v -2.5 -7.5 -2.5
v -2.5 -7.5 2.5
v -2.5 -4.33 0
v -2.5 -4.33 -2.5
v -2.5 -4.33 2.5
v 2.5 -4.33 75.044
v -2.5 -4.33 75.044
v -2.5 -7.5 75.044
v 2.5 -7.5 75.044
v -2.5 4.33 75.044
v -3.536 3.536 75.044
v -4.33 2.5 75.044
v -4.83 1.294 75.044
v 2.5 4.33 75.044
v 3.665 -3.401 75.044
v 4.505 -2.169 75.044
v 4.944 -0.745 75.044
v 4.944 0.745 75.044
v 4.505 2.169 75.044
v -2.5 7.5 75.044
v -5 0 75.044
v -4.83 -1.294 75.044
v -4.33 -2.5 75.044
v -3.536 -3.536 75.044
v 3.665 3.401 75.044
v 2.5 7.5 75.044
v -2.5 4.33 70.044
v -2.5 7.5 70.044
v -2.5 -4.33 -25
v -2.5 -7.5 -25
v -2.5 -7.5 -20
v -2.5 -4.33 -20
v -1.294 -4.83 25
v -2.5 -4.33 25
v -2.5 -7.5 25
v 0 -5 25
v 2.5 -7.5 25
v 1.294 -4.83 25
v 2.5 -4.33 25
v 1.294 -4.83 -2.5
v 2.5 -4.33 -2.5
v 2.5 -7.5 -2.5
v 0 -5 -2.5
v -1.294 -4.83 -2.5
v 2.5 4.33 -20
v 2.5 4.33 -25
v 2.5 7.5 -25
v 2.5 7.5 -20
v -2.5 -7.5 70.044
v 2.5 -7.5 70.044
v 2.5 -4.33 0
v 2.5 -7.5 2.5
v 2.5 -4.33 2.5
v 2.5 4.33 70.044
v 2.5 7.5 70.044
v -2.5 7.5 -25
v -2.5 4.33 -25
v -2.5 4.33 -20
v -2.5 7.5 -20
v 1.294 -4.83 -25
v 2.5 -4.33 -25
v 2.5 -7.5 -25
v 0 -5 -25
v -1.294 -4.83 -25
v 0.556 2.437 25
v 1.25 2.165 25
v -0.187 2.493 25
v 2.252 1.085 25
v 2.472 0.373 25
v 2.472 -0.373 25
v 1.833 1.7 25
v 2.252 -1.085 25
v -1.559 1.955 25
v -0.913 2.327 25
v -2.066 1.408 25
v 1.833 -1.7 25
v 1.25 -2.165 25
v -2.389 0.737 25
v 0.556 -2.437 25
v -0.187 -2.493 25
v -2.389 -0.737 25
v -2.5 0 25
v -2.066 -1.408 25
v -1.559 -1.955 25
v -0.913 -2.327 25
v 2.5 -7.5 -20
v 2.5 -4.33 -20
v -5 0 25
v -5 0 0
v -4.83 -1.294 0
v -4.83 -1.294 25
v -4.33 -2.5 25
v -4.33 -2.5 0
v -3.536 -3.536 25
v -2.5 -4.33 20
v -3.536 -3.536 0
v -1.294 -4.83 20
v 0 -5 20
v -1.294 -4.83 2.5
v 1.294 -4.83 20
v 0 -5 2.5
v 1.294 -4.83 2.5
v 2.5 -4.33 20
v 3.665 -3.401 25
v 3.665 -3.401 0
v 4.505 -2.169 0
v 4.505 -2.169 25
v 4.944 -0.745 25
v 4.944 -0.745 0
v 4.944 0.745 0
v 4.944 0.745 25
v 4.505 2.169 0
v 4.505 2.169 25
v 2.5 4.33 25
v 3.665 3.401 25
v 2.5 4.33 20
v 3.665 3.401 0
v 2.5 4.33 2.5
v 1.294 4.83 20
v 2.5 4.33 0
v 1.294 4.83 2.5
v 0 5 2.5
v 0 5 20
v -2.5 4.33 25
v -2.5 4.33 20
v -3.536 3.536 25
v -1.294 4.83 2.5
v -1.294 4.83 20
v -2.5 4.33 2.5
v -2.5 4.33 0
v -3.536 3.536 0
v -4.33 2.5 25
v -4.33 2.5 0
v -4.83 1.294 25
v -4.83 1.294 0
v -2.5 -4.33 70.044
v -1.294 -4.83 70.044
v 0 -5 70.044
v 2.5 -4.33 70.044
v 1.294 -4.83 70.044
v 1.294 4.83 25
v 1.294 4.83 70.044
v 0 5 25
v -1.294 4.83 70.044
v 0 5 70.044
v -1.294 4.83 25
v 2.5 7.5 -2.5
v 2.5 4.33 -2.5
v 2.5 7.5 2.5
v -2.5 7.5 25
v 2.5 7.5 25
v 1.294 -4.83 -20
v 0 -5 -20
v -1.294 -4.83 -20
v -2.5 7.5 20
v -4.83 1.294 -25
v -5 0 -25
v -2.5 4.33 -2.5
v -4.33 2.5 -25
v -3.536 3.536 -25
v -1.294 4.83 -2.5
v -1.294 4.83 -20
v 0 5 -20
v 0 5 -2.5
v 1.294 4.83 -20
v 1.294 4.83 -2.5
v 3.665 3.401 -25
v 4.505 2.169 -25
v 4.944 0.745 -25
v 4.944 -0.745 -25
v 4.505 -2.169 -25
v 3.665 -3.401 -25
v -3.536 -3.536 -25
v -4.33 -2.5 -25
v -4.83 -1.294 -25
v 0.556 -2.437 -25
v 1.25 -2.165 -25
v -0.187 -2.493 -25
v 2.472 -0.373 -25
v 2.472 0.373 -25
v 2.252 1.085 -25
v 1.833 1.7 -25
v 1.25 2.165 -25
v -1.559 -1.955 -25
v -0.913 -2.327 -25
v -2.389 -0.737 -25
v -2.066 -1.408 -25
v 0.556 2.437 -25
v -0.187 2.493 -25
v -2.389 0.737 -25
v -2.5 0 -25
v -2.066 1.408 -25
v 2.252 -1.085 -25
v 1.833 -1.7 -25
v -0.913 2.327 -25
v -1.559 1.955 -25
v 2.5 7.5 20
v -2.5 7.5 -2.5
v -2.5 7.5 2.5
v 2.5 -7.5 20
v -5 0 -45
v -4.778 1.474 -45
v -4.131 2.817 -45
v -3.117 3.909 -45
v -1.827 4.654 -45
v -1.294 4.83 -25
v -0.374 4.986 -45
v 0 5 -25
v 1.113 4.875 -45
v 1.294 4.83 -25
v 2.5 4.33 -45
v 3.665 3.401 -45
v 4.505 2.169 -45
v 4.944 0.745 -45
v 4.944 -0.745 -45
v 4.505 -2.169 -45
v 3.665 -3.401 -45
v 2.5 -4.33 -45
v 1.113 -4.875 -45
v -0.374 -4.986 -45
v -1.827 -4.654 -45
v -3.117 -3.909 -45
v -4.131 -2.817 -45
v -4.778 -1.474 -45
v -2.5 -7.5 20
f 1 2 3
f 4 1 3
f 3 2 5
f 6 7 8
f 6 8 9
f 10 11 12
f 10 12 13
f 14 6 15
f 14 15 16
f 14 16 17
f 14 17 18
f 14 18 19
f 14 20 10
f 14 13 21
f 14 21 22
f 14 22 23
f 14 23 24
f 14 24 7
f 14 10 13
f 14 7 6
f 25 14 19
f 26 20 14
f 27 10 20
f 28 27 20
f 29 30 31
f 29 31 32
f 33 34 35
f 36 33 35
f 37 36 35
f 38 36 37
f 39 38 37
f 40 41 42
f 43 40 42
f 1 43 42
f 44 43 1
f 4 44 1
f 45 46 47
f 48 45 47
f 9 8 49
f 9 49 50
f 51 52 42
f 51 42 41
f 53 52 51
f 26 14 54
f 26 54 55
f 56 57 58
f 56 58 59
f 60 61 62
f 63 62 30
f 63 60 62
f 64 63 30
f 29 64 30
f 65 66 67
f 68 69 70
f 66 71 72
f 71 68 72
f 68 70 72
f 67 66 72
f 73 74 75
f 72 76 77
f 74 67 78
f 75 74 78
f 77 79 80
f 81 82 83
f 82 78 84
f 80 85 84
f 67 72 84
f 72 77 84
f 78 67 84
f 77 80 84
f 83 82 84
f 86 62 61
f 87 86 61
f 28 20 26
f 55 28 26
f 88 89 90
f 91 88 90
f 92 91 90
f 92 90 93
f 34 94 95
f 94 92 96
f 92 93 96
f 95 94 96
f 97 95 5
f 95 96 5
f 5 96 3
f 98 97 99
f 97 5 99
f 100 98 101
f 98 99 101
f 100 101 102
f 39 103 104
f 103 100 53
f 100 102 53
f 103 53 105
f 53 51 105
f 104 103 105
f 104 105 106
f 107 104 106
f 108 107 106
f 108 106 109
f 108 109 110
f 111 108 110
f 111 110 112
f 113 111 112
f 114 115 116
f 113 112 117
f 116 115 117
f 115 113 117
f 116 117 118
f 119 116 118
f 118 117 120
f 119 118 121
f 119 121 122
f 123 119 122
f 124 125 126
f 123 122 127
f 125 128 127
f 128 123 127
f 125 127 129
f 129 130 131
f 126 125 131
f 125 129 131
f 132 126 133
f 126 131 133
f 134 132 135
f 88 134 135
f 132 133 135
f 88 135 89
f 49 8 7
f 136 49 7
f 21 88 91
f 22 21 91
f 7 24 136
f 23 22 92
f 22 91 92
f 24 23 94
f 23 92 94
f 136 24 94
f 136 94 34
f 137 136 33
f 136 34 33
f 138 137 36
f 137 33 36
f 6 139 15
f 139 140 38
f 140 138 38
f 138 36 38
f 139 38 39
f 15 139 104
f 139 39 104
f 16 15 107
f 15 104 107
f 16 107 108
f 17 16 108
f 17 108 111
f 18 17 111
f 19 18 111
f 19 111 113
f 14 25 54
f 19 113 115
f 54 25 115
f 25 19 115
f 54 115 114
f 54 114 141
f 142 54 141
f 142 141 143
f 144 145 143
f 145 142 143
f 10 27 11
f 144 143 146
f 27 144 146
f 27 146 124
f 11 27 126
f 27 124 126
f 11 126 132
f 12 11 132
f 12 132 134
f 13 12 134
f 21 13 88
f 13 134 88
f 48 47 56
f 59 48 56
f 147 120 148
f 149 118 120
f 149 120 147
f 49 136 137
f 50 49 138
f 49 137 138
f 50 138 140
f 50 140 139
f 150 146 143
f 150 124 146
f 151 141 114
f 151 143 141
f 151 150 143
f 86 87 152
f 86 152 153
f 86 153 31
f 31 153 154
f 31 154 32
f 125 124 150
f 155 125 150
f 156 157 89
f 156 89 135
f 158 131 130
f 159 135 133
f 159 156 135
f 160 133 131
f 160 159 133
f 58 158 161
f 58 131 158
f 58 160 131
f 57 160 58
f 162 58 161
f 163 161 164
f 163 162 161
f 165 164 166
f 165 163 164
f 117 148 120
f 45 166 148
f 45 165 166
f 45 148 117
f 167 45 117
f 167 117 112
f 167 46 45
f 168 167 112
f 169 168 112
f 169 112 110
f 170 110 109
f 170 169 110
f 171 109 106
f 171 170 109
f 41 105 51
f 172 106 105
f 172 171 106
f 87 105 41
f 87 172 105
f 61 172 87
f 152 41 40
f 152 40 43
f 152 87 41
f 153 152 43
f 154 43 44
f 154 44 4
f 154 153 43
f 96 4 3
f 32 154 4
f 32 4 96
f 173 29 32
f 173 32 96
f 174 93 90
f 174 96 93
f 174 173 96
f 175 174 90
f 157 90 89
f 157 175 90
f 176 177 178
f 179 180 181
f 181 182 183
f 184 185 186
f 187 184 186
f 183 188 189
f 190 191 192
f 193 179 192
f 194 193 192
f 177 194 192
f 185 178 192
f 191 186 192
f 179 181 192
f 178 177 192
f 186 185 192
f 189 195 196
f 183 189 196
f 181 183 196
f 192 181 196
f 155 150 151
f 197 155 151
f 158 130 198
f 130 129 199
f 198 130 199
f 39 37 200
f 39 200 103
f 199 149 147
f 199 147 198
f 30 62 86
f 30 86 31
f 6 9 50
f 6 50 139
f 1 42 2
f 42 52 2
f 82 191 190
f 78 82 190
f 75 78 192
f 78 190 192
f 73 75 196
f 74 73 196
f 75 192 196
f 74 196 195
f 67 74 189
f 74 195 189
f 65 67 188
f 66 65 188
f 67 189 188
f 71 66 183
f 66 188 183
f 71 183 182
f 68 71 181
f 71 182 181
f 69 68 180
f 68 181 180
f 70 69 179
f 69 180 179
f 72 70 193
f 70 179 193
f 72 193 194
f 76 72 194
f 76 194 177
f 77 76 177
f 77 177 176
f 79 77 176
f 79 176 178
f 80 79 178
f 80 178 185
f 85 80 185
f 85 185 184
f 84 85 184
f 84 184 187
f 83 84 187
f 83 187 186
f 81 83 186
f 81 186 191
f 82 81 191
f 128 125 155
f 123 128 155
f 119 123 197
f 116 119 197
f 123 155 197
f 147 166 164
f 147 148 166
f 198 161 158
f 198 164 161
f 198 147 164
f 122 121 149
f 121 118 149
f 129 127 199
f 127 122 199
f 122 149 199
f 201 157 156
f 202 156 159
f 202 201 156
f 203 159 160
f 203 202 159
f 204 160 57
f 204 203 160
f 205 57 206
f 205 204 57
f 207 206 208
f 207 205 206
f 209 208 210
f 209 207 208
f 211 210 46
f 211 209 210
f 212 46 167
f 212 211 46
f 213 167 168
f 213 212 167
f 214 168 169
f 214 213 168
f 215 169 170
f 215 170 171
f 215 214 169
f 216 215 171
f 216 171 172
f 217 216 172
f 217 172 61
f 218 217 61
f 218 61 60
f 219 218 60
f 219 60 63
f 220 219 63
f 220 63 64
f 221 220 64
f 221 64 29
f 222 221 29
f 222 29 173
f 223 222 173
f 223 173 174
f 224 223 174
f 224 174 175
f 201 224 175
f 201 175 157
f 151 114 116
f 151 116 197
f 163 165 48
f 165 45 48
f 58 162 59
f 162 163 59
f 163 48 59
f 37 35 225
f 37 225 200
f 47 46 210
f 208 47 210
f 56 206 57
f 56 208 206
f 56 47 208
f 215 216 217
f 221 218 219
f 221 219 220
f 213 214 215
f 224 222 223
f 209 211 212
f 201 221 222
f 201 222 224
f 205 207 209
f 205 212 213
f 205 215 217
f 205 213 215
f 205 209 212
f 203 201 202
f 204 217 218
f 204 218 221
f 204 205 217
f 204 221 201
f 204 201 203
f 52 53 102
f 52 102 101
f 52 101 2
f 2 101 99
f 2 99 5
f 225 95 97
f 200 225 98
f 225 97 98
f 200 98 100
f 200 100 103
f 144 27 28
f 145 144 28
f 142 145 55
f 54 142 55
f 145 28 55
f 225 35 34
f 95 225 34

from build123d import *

# Parameters (mm, degrees)
SKETCH1_R             = 5
BOSS_EXTRUDE1_DEPTH   = 25
SKETCH2_W             = 5
SKETCH2_H             = 15
BOSS_EXTRUDE2_DEPTH   = 5
SKETCH3_W             = 5
SKETCH3_H             = 15
BOSS_EXTRUDE3_DEPTH   = 2.5
SKETCH5_W             = 5
SKETCH5_H             = 15
BOSS_EXTRUDE5_DEPTH   = 2.5
BOSS_EXTRUDE6_START   = 25
SKETCH6_R             = 5
BOSS_EXTRUDE6_DEPTH   = 25
SKETCH7_W             = 5
SKETCH7_H             = 15
BOSS_EXTRUDE7_DEPTH   = 5
F_5_0MM_DOWEL_HOLE1_D = 5
BOSS_EXTRUDE8_START   = 20
SKETCH14_R            = 5
BOSS_EXTRUDE8_DEPTH   = 20
SKETCH15_R            = 5
BOSS_EXTRUDE9_DEPTH   = 50.04395072
SKETCH18_W            = 5
SKETCH18_H            = 15
BOSS_EXTRUDE10_DEPTH  = 5


with BuildPart() as part:
    # Sketch1 → Boss-Extrude1 (new body)
    with BuildSketch(Plane.XY):
        with Locations(Location((0, 0, 0), (0, 0, 180))):
            Circle(SKETCH1_R)
    extrude(amount=BOSS_EXTRUDE1_DEPTH)

    # Sketch2 → Boss-Extrude2 (add)
    with BuildSketch(Plane.XY.offset(25)):
        Rectangle(SKETCH2_W, SKETCH2_H)
    extrude(amount=-BOSS_EXTRUDE2_DEPTH)

    # Sketch3 → Boss-Extrude3 (add)
    with BuildSketch(Plane(origin=(0, 0, 0), x_dir=(-1, 0, 0), z_dir=(0, 0, -1))):
        Rectangle(SKETCH3_W, SKETCH3_H)
    extrude(amount=-BOSS_EXTRUDE3_DEPTH)

    # Sketch5 → Boss-Extrude5 (add)
    with BuildSketch(Plane(origin=(0, 0, 0), x_dir=(-1, 0, 0), z_dir=(0, 0, -1))):
        Rectangle(SKETCH5_W, SKETCH5_H)
    extrude(amount=BOSS_EXTRUDE5_DEPTH)

    # Sketch6 → Boss-Extrude6 (add)
    with BuildSketch(Plane(origin=(0, 0, 0), x_dir=(-1, 0, 0), z_dir=(0, 0, -1)).offset(BOSS_EXTRUDE6_START)):
        Circle(SKETCH6_R)
    extrude(amount=-BOSS_EXTRUDE6_DEPTH)

    # Sketch7 → Boss-Extrude7 (add)
    with BuildSketch(Plane(origin=(0, 0, -25), x_dir=(-1, 0, 0), z_dir=(0, 0, -1))):
        Rectangle(SKETCH7_W, SKETCH7_H)
    extrude(amount=-BOSS_EXTRUDE7_DEPTH)

    # Ø5.0mm Dowel Hole1 (through all)
    with Locations(Plane.XY.offset(25)):
        with Locations((0, 0)):
            Hole(F_5_0MM_DOWEL_HOLE1_D / 2)

    # Sketch14 → Boss-Extrude8 (add)
    with BuildSketch(Plane(origin=(0, 0, -25), x_dir=(-1, 0, 0), z_dir=(0, 0, -1)).offset(BOSS_EXTRUDE8_START)):
        Circle(SKETCH14_R)
    extrude(amount=-BOSS_EXTRUDE8_DEPTH)

    # Sketch15 → Boss-Extrude9 (add)
    with BuildSketch(Plane.XY.offset(25)):
        with Locations(Location((0, 0, 0), (0, 0, 180))):
            Circle(SKETCH15_R)
    extrude(amount=BOSS_EXTRUDE9_DEPTH)

    # Sketch18 → Boss-Extrude10 (add)
    with BuildSketch(Plane.XY.offset(75.04395072)):
        Rectangle(SKETCH18_W, SKETCH18_H)
    extrude(amount=-BOSS_EXTRUDE10_DEPTH)


solid = part.part
